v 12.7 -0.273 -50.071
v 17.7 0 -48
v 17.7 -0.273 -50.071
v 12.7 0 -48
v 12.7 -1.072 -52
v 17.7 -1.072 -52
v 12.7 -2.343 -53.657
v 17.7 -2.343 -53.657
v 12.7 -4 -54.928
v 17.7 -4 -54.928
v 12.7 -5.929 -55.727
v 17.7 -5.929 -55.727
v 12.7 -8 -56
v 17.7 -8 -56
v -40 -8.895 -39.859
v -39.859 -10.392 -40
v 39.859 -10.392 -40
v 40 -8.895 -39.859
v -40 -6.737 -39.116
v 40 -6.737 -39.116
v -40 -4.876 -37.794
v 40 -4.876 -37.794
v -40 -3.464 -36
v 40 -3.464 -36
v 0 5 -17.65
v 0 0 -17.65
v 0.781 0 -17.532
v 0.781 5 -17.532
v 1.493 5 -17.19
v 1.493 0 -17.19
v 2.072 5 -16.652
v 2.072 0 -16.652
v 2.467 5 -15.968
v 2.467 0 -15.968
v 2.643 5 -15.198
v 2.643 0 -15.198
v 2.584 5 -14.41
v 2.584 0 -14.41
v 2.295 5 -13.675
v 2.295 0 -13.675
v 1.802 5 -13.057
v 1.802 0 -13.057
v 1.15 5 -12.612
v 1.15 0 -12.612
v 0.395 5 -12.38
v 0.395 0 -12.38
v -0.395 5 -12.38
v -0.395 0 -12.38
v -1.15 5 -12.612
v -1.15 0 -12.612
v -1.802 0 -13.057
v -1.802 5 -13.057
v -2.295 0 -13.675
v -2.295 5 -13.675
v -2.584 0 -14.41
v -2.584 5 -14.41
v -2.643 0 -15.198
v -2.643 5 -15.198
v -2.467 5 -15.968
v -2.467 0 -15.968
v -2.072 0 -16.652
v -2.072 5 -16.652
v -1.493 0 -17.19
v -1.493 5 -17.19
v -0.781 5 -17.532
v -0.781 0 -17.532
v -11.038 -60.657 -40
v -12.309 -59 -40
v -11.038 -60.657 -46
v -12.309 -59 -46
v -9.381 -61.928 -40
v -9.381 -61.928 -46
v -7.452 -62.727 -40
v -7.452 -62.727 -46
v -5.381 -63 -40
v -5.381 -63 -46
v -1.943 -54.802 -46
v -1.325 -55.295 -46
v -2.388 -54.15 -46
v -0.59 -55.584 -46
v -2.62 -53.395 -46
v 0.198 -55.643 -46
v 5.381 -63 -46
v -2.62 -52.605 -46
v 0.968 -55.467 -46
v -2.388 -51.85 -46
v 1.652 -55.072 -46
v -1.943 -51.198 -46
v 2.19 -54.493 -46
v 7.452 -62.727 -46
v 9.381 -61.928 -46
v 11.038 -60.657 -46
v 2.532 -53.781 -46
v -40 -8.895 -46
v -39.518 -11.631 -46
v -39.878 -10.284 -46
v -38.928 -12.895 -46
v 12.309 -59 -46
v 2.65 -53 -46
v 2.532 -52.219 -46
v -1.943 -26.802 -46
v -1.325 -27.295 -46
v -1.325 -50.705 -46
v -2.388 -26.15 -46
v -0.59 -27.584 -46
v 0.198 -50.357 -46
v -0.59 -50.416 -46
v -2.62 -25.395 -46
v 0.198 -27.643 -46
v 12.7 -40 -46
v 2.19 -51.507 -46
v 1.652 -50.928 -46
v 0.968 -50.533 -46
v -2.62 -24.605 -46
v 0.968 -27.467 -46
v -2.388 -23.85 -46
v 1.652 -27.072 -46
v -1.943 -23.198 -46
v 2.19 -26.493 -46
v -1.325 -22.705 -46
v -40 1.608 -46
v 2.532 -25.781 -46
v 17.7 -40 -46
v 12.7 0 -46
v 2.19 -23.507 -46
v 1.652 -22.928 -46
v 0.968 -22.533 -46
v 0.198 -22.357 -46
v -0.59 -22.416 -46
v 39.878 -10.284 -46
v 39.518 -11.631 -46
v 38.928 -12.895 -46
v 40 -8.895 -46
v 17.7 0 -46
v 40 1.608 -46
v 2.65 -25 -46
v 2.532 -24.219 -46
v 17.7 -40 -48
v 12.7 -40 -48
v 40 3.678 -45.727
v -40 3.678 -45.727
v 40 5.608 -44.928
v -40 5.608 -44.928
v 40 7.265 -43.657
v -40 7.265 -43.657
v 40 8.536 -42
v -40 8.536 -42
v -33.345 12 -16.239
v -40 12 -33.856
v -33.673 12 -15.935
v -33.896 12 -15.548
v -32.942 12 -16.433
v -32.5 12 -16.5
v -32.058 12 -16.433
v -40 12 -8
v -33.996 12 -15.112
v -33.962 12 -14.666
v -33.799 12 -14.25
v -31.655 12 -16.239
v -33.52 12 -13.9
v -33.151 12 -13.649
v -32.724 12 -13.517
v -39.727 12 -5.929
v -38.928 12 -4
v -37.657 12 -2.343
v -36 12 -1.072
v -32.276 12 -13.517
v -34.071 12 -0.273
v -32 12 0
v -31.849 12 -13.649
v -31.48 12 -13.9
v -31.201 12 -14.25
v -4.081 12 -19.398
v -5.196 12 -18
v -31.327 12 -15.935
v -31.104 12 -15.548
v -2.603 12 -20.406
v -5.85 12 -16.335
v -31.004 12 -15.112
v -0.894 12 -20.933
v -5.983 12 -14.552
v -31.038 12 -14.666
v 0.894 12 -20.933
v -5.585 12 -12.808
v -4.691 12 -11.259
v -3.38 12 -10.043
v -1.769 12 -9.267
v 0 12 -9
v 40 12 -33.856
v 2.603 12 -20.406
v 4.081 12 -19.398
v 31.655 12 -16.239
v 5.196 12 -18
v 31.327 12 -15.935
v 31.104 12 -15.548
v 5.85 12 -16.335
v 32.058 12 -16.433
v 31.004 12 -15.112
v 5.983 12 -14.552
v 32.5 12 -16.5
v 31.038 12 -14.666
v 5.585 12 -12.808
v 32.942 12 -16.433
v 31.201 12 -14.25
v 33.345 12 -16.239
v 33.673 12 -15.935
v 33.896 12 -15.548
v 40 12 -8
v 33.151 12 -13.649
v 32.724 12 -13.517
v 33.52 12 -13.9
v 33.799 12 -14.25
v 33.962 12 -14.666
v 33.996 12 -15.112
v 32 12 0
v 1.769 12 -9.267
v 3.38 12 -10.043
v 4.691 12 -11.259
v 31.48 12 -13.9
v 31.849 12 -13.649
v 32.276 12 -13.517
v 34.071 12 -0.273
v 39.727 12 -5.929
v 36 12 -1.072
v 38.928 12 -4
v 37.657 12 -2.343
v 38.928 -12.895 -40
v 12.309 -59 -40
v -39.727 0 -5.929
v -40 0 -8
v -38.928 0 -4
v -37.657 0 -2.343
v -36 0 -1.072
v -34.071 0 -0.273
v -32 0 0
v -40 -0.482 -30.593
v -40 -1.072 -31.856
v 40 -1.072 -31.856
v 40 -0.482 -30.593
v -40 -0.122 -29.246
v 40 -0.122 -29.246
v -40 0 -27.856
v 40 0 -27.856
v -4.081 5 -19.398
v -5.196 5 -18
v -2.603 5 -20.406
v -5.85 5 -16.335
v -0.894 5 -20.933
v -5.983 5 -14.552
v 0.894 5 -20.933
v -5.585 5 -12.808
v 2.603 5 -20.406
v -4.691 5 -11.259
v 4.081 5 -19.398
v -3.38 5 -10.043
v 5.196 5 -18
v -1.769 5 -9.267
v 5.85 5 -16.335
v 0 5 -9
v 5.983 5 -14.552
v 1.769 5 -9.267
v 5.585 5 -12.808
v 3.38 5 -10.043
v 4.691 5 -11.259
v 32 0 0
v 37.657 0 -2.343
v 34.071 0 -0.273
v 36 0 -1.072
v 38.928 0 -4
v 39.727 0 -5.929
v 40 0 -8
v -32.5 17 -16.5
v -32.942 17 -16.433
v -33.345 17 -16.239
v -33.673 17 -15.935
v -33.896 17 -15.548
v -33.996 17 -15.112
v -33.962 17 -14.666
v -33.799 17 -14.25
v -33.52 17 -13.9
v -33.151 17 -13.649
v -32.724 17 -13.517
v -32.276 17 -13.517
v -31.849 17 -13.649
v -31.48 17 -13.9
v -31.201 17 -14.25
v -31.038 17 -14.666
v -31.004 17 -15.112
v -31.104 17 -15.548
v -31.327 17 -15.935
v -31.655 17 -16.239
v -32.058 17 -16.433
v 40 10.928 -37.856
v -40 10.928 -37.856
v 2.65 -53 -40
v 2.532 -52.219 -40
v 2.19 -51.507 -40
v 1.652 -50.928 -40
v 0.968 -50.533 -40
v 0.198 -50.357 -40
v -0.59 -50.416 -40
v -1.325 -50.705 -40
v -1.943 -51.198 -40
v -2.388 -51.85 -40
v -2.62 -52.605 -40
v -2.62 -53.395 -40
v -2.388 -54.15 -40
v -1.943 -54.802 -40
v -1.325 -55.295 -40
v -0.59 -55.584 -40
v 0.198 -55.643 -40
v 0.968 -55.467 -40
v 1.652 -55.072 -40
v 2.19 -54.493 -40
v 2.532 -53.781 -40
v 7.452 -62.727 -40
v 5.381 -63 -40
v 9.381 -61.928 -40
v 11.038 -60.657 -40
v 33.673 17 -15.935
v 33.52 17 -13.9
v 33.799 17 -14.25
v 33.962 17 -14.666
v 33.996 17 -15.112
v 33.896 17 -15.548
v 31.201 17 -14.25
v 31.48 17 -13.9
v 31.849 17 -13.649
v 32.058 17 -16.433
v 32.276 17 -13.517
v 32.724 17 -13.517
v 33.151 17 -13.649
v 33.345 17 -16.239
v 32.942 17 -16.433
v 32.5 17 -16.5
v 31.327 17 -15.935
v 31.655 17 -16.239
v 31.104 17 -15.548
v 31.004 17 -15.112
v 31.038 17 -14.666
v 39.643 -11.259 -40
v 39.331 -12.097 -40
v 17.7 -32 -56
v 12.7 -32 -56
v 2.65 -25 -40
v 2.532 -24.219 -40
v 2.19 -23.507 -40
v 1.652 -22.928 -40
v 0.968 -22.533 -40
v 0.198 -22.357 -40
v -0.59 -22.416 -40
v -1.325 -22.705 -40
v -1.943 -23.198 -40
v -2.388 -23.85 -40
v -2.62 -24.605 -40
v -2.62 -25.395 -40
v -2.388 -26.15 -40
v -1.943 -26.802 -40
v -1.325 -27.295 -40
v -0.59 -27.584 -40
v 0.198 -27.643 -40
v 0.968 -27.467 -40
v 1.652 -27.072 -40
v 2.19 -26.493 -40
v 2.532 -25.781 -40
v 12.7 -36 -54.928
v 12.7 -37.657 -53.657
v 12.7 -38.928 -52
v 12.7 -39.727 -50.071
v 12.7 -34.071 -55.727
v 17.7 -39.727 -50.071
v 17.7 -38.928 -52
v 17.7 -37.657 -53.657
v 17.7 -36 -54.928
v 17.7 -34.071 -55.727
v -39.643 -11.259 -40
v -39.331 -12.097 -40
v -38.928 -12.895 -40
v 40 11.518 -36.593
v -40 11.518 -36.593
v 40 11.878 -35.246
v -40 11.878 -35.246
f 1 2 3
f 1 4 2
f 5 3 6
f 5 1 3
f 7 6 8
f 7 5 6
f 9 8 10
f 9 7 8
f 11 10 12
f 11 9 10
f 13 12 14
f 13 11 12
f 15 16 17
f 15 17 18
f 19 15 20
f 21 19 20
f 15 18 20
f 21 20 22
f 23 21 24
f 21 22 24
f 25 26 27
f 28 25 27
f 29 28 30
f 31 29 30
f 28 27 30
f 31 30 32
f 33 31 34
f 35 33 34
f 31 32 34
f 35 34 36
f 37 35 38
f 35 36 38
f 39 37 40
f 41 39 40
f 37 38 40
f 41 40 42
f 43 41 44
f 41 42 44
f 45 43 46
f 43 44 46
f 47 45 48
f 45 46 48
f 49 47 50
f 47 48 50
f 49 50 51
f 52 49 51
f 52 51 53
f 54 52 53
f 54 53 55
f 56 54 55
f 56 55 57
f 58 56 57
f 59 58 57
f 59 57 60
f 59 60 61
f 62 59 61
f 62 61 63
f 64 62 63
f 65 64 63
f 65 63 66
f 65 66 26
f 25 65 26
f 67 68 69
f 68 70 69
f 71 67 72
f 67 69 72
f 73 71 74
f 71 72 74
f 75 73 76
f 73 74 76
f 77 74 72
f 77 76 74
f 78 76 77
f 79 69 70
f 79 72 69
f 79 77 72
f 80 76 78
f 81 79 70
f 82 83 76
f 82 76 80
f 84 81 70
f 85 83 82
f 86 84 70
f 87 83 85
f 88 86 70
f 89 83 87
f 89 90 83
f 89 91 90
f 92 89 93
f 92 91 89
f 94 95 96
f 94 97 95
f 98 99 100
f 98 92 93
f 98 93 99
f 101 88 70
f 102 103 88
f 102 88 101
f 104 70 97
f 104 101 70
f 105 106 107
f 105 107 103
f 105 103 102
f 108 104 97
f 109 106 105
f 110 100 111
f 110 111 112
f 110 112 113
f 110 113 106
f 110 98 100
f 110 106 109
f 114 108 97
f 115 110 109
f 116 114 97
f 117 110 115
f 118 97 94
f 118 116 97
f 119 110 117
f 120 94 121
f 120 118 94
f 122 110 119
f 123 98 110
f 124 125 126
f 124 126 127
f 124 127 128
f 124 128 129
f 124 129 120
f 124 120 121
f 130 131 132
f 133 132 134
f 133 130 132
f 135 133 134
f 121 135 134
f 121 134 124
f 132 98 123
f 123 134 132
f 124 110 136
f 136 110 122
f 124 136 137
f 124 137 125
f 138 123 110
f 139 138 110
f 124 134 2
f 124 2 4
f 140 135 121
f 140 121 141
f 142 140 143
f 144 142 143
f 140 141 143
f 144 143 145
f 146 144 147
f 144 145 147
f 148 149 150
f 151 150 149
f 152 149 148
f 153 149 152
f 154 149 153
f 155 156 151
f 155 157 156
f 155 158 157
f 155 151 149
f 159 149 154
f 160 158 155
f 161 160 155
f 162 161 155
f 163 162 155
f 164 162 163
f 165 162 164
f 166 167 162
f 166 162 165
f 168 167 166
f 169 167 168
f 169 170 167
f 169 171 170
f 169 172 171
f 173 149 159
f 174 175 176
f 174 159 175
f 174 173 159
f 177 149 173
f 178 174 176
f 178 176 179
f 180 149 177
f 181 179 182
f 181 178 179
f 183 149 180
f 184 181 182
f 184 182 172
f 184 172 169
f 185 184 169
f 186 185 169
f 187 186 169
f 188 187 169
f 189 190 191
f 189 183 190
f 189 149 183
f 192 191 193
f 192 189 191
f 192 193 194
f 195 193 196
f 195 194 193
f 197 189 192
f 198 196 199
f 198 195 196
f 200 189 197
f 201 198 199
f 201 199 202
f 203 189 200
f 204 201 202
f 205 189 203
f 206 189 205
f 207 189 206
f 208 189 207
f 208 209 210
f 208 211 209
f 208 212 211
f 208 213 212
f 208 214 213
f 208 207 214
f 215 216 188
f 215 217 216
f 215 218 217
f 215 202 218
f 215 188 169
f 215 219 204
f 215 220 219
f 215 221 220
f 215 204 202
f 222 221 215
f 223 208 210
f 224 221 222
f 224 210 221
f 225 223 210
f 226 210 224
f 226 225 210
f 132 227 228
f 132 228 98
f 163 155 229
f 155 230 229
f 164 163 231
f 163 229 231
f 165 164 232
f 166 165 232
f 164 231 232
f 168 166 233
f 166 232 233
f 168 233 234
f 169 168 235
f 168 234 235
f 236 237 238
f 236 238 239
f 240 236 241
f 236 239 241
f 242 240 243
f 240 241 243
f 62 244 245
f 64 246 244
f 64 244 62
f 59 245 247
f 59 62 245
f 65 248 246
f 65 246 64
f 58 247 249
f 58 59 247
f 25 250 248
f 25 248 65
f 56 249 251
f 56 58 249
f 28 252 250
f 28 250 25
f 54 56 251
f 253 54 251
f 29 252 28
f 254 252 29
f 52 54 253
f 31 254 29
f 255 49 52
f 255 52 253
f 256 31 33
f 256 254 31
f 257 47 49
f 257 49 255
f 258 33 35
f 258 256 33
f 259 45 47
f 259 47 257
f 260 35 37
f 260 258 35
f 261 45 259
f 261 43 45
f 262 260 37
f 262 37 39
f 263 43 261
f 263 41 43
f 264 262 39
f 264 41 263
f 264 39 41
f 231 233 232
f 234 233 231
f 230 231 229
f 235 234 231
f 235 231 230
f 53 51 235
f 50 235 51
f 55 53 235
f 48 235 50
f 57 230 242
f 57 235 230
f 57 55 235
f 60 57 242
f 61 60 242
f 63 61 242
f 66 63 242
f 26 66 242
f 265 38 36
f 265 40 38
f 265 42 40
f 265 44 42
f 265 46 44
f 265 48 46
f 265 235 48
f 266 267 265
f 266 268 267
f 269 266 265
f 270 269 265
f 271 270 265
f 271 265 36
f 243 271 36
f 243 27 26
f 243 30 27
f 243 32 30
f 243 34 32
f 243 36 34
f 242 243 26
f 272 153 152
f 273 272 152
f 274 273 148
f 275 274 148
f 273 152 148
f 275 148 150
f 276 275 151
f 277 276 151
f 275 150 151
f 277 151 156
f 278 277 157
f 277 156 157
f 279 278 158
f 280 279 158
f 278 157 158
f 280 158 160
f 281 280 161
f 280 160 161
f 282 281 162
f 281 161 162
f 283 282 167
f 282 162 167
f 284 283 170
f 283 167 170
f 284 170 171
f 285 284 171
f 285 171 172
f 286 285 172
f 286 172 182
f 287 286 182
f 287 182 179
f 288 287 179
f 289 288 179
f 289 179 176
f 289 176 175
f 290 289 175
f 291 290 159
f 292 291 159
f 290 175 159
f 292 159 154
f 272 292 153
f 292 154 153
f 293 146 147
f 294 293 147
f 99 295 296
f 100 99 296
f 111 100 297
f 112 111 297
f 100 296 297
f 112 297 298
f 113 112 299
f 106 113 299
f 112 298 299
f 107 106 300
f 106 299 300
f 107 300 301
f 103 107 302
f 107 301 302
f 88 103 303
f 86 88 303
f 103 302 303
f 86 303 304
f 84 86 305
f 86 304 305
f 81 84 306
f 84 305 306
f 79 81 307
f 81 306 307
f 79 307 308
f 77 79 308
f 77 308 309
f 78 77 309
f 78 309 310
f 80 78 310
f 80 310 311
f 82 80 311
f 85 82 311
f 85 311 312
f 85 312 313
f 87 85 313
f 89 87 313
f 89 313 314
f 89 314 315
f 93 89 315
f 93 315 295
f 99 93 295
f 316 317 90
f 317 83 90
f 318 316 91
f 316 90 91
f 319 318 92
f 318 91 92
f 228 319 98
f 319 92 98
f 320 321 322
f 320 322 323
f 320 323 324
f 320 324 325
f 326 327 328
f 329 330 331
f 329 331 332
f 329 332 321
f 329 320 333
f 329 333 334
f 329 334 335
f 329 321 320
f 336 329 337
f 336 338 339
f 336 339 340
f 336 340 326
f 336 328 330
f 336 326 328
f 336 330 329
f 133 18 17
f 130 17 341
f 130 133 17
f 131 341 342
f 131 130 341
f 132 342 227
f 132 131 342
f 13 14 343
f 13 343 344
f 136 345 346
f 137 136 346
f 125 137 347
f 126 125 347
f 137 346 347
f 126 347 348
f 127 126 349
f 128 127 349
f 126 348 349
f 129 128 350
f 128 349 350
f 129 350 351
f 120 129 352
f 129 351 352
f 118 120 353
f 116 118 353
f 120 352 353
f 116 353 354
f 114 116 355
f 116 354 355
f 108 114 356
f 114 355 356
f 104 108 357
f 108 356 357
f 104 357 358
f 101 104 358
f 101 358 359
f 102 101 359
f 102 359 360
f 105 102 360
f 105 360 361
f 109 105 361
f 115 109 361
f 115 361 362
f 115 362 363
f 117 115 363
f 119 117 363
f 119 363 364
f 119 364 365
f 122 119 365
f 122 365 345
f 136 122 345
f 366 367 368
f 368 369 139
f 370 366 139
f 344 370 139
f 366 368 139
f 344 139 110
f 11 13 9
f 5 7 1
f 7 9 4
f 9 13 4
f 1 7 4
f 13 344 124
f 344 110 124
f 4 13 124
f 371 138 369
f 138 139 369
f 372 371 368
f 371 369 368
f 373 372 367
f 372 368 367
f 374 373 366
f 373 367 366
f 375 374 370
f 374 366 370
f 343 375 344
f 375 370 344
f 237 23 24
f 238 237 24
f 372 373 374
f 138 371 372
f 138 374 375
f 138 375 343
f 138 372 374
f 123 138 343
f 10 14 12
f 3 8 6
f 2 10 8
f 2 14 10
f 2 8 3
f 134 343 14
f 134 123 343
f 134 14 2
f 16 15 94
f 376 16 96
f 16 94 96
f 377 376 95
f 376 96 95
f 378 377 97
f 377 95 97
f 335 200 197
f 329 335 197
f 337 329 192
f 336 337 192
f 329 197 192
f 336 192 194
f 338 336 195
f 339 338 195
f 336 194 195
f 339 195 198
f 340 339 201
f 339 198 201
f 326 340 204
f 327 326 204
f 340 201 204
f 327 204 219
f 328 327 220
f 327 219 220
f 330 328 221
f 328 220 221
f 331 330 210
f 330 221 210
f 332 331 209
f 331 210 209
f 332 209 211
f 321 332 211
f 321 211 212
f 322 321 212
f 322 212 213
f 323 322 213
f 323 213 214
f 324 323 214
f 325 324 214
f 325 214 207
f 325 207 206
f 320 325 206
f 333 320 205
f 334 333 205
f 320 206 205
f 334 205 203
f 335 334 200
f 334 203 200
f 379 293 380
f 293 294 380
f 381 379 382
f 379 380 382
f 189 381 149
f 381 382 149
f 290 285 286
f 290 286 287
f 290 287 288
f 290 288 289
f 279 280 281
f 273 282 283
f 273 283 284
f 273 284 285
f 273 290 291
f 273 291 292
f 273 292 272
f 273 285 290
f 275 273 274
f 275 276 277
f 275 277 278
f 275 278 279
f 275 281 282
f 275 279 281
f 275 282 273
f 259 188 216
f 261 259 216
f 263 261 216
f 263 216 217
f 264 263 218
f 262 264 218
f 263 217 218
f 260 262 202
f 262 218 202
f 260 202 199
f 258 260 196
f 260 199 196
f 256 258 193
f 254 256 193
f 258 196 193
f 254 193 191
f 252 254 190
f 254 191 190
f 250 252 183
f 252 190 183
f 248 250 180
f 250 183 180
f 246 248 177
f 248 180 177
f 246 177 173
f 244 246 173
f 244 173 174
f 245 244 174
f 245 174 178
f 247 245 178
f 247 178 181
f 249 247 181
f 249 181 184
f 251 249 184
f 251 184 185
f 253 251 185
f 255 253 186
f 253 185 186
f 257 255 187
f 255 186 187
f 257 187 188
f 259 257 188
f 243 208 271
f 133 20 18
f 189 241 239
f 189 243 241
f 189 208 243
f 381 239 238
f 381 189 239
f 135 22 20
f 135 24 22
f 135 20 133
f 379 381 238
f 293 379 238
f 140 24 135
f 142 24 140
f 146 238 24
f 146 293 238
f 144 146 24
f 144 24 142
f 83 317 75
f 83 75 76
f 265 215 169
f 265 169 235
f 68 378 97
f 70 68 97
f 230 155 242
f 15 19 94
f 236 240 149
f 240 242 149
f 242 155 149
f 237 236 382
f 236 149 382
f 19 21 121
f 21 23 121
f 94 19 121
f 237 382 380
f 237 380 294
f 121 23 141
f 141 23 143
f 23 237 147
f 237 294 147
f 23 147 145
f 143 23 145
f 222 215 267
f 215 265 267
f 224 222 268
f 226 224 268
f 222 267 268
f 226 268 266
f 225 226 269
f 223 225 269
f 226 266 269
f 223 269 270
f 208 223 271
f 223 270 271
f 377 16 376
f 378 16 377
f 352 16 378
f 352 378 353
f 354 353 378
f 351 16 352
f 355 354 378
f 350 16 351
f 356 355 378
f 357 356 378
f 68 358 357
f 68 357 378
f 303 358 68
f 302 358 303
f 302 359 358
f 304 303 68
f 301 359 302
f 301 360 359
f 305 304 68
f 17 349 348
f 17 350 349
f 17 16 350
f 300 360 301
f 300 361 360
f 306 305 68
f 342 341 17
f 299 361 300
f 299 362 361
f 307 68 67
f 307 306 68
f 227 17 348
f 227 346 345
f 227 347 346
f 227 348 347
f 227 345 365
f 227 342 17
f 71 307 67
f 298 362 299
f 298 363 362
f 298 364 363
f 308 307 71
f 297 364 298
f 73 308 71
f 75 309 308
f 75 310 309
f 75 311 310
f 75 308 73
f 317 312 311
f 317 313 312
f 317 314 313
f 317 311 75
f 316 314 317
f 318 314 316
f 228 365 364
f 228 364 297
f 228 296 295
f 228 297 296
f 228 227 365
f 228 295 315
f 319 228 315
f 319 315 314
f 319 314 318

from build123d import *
from OCP.BRepFilletAPI import BRepFilletAPI_MakeChamfer

# Parameters (mm, degrees)
BOSS_EXTRUDE1_DEPTH = 40
SKETCH2_R           = 2.65
CUT_EXTRUDE2_DEPTH  = 12
SKETCH3_R           = 6
CUT_EXTRUDE3_DEPTH  = 7
CUT_EXTRUDE4_REACH  = 86.67
SKETCH4_R           = 2.65
CHAMFER2_SIZE       = 30
CHAMFER2_SIZE2      = 51.961524227
SKETCH7_W           = 5
SKETCH7_H           = 40
BOSS_EXTRUDE3_DEPTH = 10
CHAMFER1_SIZE       = 10
CHAMFER1_SIZE2      = 5.773502692
FILLET1_R           = 8
FILLET2_R           = 8
SKETCH5_R           = 1.5
BOSS_EXTRUDE2_DEPTH = 5
FILLET3_R           = 8


with BuildPart() as part:
    # Sketch1 → Boss-Extrude1 (new, symmetric)
    with BuildSketch(Plane(origin=(0, 0, 0), x_dir=(0, 0, -1), z_dir=(1, 0, 0))):
        Polygon((0, 0), (40, 0), (40, -63), (46, -63), (46, 12), (0, 12), align=None)
    extrude(amount=BOSS_EXTRUDE1_DEPTH, both=True)

    # Sketch2 → Cut-Extrude2 (cut)
    with BuildSketch(Plane.XZ):
        with Locations(Location((0, -15, 0), (0, 0, 270))):
            Circle(SKETCH2_R)
    extrude(amount=-CUT_EXTRUDE2_DEPTH, mode=Mode.SUBTRACT)

    # Sketch3 → Cut-Extrude3 (cut)
    with BuildSketch(Plane(origin=(0, 12, 0), x_dir=(1, 0, 0), z_dir=(0, 1, 0))):
        with Locations(Location((0, 15, 0), (0, 0, 270))):
            Circle(SKETCH3_R)
    extrude(amount=-CUT_EXTRUDE3_DEPTH, mode=Mode.SUBTRACT)

    # Sketch4 → Cut-Extrude4 (cut, up to next)
    with BuildSketch(Plane.XY.offset(-40), mode=Mode.PRIVATE) as cut_extrude4_sk1:
        with Locations((0, -53)):
            Circle(SKETCH4_R)
    cut_extrude4_tool1 = extrude(cut_extrude4_sk1.sketch, amount=-CUT_EXTRUDE4_REACH, mode=Mode.PRIVATE) & part.part
    # Sketch4 → Cut-Extrude4 (cut, up to next)
    with BuildSketch(Plane.XY.offset(-40), mode=Mode.PRIVATE) as cut_extrude4_sk2:
        with Locations((0, -25)):
            Circle(SKETCH4_R)
    cut_extrude4_tool2 = extrude(cut_extrude4_sk2.sketch, amount=-CUT_EXTRUDE4_REACH, mode=Mode.PRIVATE) & part.part
    add(cut_extrude4_tool1.solids().sort_by_distance((0, -53, -40))[0], mode=Mode.SUBTRACT)
    add(cut_extrude4_tool2.solids().sort_by_distance((0, -25, -40))[0], mode=Mode.SUBTRACT)

    # Chamfer2
    chamfer2_edges = [part.edges().sort_by_distance(p)[0] for p in [
        (40, -63, -43),
        (-40, -63, -43),
    ]]
    chamfer2_side = [part.faces().sort_by_distance(p)[0] for p in [
        (0, -63, -43),
    ]]
    chamfer(chamfer2_edges, length=CHAMFER2_SIZE, length2=CHAMFER2_SIZE2, reference=chamfer2_side[0])

    # Sketch7 → Boss-Extrude3 (add)
    with BuildSketch(Plane(origin=(0, 0, -46), x_dir=(-1, 0, 0), z_dir=(0, 0, -1))):
        with Locations((-15.2, -20)):
            Rectangle(SKETCH7_W, SKETCH7_H)
    extrude(amount=BOSS_EXTRUDE3_DEPTH)

    # Chamfer1: one chamfer whose edges measure the first distance from different faces: ONE call of the kernel's chamfer builder (chamfer() names one face for all edges)
    chamfer1_edges_1 = [part.edges().sort_by_distance(p)[0] for p in [
        (0, 12, -46),
    ]]
    chamfer1_side_1 = [part.faces().sort_by_distance(p)[0] for p in [
        (0, 12, -23.253659483),
    ]]
    chamfer1_edges_2 = [part.edges().sort_by_distance(p)[0] for p in [
        (0, 0, -40),
    ]]
    chamfer1_side_2 = [part.faces().sort_by_distance(p)[0] for p in [
        (0, 0, -20.034710925),
    ]]
    chamfer1 = BRepFilletAPI_MakeChamfer(part.part.solid().wrapped)
    for e in chamfer1_edges_1:
        chamfer1.Add(CHAMFER1_SIZE, CHAMFER1_SIZE2, e.wrapped, chamfer1_side_1[0].wrapped)  # the first distance lies on this face
    for e in chamfer1_edges_2:
        chamfer1.Add(CHAMFER1_SIZE, CHAMFER1_SIZE2, e.wrapped, chamfer1_side_2[0].wrapped)  # the first distance lies on this face
    add(Compound.cast(chamfer1.Shape()), mode=Mode.REPLACE)

    # Fillet1
    fillet1_edges = [part.edges().sort_by_distance(p)[0] for p in [
        (0, 12, -36),
        (0, 6.226497308, -46),
        (0, -5.773502692, -40),
        (0, 0, -30),
    ]]
    fillet(fillet1_edges, radius=FILLET1_R)

    # Fillet2
    fillet2_edges = [part.edges().sort_by_distance(p)[0] for p in [
        (-40, 6, 0),
        (40, 6, 0),
        (-40, -11.038475773, -43),
        (40, -11.038475773, -43),
        (10, -63, -43),
        (-10, -63, -43),
    ]]
    fillet(fillet2_edges, radius=FILLET2_R)

    # Sketch5 → Boss-Extrude2 (add)
    with BuildSketch(Plane(origin=(0, 12, 0), x_dir=(1, 0, 0), z_dir=(0, 1, 0))):
        with Locations(Location((-32.5, 15, 0), (0, 0, 90))):
            Circle(SKETCH5_R)
        with Locations(Location((32.5, 15, 0), (0, 0, 90))):
            Circle(SKETCH5_R)
    extrude(amount=BOSS_EXTRUDE2_DEPTH)

    # Fillet3
    fillet3_edges = [part.edges().sort_by_distance(p)[0] for p in [
        (15.2, 0, -56),
        (15.2, -40, -56),
    ]]
    fillet(fillet3_edges, radius=FILLET3_R)


solid = part.part
